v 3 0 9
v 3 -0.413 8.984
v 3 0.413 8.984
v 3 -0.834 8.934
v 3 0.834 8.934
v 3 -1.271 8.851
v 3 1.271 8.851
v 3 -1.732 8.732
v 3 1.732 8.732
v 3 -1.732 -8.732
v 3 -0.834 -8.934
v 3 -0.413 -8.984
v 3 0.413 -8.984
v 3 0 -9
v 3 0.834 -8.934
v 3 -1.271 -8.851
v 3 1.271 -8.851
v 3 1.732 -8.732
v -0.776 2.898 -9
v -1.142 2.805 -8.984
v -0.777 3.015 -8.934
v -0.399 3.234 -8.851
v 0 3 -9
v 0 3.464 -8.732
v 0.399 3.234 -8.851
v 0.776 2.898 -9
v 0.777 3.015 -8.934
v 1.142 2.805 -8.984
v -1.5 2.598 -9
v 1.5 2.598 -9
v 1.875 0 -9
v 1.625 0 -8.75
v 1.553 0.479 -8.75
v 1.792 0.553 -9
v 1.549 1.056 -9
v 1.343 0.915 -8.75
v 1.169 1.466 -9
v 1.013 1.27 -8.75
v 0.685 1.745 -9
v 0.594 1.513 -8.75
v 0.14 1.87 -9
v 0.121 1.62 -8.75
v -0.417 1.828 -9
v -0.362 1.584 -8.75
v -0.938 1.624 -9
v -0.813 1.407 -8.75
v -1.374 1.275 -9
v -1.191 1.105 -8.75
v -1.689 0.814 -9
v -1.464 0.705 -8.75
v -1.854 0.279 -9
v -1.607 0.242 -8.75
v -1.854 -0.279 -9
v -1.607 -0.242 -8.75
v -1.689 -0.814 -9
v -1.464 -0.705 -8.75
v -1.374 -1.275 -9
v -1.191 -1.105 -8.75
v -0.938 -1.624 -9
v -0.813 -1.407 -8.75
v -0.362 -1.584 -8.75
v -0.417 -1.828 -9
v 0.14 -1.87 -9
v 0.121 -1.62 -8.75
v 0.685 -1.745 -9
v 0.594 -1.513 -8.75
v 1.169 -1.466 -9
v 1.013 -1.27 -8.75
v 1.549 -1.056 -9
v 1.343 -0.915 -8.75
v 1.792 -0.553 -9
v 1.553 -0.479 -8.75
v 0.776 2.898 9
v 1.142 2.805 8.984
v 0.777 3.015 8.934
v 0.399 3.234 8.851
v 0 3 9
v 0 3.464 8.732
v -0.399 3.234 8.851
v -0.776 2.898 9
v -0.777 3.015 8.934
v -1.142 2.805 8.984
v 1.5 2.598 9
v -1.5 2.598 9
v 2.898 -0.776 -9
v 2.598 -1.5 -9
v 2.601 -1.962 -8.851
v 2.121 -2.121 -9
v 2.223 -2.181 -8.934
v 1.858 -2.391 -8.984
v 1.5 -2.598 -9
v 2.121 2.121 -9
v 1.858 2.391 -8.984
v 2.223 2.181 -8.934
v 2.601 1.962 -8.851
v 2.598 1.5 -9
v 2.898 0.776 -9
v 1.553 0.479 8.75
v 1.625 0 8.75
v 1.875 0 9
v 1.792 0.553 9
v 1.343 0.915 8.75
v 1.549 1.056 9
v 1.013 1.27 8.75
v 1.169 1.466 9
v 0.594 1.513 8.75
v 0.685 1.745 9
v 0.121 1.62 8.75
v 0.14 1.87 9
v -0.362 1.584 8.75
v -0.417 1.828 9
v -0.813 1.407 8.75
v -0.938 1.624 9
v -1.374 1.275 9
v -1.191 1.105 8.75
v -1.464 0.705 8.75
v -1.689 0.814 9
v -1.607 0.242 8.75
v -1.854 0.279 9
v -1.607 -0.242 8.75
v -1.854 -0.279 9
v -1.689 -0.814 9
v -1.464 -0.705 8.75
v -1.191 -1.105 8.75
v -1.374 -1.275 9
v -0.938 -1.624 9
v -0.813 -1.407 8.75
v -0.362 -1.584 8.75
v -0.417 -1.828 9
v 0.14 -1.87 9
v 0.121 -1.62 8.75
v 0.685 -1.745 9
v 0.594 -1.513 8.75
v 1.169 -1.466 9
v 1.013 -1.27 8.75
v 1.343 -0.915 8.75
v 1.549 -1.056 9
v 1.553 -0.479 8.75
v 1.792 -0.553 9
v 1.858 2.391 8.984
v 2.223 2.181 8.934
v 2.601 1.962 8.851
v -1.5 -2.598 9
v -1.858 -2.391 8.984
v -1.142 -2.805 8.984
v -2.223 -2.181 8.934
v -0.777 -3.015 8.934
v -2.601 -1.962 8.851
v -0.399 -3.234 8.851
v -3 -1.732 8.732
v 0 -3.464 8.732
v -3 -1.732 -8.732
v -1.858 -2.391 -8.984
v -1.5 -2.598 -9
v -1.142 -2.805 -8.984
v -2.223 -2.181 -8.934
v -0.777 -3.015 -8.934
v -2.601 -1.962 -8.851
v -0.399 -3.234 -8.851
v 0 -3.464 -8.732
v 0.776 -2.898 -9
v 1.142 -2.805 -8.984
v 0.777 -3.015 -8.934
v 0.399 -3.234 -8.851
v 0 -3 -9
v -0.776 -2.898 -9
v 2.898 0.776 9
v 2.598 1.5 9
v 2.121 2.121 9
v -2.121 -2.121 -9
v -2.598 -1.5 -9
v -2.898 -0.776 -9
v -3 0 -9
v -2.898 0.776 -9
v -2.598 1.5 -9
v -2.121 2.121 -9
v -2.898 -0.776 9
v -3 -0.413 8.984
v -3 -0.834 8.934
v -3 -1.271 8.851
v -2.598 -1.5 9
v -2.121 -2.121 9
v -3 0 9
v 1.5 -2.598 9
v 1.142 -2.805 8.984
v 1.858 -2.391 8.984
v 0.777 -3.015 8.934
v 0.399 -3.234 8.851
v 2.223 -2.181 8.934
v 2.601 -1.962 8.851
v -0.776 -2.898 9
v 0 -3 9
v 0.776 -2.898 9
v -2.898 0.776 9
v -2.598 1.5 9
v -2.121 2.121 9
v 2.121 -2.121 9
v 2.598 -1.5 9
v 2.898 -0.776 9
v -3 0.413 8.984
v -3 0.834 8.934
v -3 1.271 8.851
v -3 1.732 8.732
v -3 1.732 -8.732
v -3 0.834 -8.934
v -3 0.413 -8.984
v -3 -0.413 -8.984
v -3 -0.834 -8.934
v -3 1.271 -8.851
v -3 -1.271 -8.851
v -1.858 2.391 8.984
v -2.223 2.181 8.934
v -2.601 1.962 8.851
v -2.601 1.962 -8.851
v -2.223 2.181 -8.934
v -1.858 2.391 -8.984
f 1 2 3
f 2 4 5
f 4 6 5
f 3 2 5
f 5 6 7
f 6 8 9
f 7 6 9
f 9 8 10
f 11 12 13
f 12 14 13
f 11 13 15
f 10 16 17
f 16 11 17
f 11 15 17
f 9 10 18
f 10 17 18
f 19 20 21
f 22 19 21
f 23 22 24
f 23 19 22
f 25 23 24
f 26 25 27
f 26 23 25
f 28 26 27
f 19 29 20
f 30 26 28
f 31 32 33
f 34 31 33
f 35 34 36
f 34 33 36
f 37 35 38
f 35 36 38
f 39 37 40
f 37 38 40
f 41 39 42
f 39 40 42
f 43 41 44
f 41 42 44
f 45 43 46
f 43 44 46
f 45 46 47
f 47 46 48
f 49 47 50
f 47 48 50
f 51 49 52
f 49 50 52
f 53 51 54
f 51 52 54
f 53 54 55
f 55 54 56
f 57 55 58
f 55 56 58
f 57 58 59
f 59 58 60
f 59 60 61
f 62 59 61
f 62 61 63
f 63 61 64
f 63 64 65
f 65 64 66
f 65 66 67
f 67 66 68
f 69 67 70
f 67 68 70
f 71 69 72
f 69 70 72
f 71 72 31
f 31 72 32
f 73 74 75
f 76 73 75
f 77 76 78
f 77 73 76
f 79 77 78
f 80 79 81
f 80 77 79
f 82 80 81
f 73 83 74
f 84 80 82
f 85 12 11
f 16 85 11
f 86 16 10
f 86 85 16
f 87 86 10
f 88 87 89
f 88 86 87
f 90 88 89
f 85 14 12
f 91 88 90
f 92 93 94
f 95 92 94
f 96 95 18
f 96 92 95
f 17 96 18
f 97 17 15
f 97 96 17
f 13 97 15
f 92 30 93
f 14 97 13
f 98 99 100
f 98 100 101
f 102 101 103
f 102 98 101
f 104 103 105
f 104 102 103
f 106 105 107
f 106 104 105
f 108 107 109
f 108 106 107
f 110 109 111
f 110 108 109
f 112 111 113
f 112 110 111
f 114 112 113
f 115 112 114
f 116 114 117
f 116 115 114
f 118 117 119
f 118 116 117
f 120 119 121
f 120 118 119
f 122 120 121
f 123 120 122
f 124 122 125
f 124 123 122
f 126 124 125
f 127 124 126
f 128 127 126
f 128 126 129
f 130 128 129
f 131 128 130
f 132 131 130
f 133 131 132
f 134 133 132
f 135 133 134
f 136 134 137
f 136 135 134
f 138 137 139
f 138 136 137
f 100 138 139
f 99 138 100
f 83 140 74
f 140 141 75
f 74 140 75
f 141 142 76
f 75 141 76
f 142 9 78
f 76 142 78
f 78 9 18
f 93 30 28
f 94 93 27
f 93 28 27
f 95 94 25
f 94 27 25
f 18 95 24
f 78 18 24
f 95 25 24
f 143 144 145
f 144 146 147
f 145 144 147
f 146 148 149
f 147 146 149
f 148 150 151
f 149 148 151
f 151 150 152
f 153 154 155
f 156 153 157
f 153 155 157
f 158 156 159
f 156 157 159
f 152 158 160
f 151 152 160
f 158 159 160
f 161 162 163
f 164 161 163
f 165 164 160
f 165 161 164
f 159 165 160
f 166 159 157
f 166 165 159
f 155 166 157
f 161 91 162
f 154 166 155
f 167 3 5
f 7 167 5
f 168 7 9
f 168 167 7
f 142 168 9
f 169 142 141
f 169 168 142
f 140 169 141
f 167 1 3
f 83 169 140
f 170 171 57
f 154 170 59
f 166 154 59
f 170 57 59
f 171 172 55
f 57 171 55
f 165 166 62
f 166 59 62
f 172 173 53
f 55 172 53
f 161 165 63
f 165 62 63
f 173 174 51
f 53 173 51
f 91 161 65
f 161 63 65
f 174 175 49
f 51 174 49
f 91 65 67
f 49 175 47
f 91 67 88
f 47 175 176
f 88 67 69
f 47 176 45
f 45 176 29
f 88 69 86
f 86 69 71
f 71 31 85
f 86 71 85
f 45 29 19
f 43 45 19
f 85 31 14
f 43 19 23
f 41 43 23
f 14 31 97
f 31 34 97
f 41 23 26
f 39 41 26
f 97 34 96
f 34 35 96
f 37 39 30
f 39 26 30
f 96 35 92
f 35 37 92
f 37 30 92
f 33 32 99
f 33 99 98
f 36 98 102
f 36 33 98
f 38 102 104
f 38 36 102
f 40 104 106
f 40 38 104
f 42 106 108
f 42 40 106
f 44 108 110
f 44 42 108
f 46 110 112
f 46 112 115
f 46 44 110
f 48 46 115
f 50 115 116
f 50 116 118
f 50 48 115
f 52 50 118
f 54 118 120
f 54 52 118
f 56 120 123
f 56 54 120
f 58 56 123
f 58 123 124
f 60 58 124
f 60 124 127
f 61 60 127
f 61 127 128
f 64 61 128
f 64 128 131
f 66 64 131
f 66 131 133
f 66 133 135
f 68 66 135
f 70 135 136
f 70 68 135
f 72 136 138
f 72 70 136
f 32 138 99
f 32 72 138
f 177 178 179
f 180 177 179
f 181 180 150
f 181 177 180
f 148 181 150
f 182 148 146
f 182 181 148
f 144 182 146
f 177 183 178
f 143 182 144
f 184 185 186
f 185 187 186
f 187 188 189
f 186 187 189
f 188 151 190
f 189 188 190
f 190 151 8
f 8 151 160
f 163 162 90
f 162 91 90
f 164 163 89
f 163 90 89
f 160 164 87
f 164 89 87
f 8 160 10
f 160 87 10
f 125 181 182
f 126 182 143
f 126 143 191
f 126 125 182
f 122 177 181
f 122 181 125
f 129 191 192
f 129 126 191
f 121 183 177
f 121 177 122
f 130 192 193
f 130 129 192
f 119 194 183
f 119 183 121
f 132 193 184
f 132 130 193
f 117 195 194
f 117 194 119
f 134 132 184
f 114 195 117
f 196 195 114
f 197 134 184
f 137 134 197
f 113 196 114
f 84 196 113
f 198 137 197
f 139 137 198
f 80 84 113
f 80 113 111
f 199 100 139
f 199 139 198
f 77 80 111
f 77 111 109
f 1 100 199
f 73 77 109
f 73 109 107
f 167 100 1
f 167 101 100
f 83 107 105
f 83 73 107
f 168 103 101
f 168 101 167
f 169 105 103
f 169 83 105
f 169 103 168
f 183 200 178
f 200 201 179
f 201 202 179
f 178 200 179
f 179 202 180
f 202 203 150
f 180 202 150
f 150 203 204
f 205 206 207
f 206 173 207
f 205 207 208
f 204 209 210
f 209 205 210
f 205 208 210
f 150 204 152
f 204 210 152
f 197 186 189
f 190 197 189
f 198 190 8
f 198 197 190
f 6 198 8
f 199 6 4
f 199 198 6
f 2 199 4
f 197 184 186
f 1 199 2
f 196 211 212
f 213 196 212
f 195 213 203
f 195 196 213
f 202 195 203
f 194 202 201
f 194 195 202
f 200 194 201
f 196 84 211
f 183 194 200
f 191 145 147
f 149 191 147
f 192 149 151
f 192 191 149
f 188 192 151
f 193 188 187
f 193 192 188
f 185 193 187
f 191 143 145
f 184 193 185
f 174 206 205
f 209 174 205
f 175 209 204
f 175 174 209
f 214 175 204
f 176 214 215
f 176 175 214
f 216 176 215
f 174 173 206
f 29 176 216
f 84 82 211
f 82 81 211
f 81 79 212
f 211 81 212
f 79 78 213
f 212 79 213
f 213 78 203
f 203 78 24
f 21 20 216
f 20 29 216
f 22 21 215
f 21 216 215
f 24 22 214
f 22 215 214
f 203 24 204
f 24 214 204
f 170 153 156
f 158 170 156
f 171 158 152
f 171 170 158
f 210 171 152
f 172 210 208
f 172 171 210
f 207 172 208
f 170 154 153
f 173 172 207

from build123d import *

# Parameters (mm, degrees)
BOSS_EXTRUDE1_DEPTH      = 9
BOSS_EXTRUDE1_DEPTH_BACK = 9
SKETCH1_R                = 1.625
SKETCH2_OUTSIDE_W        = 79.846
SKETCH2_OUTSIDE_H        = 80.774
SKETCH2_OUTSIDE_R        = 3
CUT_EXTRUDE1_DEPTH       = 19.574175621
CUT_EXTRUDE1_DRAFT       = -60
SKETCH3_OUTSIDE_W        = 79.846
SKETCH3_OUTSIDE_H        = 80.774
SKETCH3_OUTSIDE_R        = 3
CUT_EXTRUDE2_DEPTH       = 19.574175621
CUT_EXTRUDE2_DRAFT       = -60
CHAMFER1_SIZE            = 0.25


with BuildPart() as part:
    # Sketch1 → Boss-Extrude1 (new, two sides: drawn at the far end of the back side and taken through both)
    with BuildSketch(Plane.XY.offset(-BOSS_EXTRUDE1_DEPTH_BACK)):
        Polygon((0, 3.464101615), (-3, 1.732050808), (-3, -1.732050808), (0, -3.464101615), (3, -1.732050808), (3, 1.732050808), align=None)
        Circle(SKETCH1_R, mode=Mode.SUBTRACT)
    extrude(amount=BOSS_EXTRUDE1_DEPTH + BOSS_EXTRUDE1_DEPTH_BACK)


with BuildPart() as cut_extrude1_tool:
    # Sketch2 outside → Cut-Extrude1 (with draft: the straight prism first)
    with BuildSketch(Plane(origin=(0, 0, -9), x_dir=(-1, 0, 0), z_dir=(0, 0, -1))):
        Rectangle(SKETCH2_OUTSIDE_W, SKETCH2_OUTSIDE_H)
        Circle(SKETCH2_OUTSIDE_R, mode=Mode.SUBTRACT)
    extrude(amount=-CUT_EXTRUDE1_DEPTH)
    # Cut-Extrude1: the draft: its side faces are tilted about the plane it starts from
    cut_extrude1_sides = [cut_extrude1_tool.faces().sort_by_distance(p)[0] for p in [
        (0, -40.387, 0.787087811),
        (-39.923, 0, 0.787087811),
        (0, 40.387, 0.787087811),
        (39.923, 0, 0.787087811),
        (3, 0, 0.787087811),
    ]]
    draft(cut_extrude1_sides, Plane(origin=(0, 0, -9), x_dir=(-1, 0, 0), z_dir=(0, 0, -1)), CUT_EXTRUDE1_DRAFT)


with BuildPart() as part_1:
    add(part.part)

    # Cut-Extrude1: cut by cut_extrude1_tool
    add(cut_extrude1_tool.part, mode=Mode.SUBTRACT)


with BuildPart() as cut_extrude2_tool:
    # Sketch3 outside → Cut-Extrude2 (with draft: the straight prism first)
    with BuildSketch(Plane.XY.offset(9)):
        Rectangle(SKETCH3_OUTSIDE_W, SKETCH3_OUTSIDE_H)
        Circle(SKETCH3_OUTSIDE_R, mode=Mode.SUBTRACT)
    extrude(amount=-CUT_EXTRUDE2_DEPTH)
    # Cut-Extrude2: the draft: its side faces are tilted about the plane it starts from
    cut_extrude2_sides = [cut_extrude2_tool.faces().sort_by_distance(p)[0] for p in [
        (0, -40.387, -0.787087811),
        (39.923, 0, -0.787087811),
        (0, 40.387, -0.787087811),
        (-39.923, 0, -0.787087811),
        (-3, 0, -0.787087811),
    ]]
    draft(cut_extrude2_sides, Plane.XY.offset(9), CUT_EXTRUDE2_DRAFT)


with BuildPart() as part_2:
    add(part_1.part)

    # Cut-Extrude2: cut by cut_extrude2_tool
    add(cut_extrude2_tool.part, mode=Mode.SUBTRACT)

    # Chamfer1
    chamfer1_edges = [part_2.edges().sort_by_distance(p)[0] for p in [
        (-1.625, 0, -9),
        (-1.625, 0, 9),
    ]]
    chamfer(chamfer1_edges, length=CHAMFER1_SIZE)


solid = part_2.part
